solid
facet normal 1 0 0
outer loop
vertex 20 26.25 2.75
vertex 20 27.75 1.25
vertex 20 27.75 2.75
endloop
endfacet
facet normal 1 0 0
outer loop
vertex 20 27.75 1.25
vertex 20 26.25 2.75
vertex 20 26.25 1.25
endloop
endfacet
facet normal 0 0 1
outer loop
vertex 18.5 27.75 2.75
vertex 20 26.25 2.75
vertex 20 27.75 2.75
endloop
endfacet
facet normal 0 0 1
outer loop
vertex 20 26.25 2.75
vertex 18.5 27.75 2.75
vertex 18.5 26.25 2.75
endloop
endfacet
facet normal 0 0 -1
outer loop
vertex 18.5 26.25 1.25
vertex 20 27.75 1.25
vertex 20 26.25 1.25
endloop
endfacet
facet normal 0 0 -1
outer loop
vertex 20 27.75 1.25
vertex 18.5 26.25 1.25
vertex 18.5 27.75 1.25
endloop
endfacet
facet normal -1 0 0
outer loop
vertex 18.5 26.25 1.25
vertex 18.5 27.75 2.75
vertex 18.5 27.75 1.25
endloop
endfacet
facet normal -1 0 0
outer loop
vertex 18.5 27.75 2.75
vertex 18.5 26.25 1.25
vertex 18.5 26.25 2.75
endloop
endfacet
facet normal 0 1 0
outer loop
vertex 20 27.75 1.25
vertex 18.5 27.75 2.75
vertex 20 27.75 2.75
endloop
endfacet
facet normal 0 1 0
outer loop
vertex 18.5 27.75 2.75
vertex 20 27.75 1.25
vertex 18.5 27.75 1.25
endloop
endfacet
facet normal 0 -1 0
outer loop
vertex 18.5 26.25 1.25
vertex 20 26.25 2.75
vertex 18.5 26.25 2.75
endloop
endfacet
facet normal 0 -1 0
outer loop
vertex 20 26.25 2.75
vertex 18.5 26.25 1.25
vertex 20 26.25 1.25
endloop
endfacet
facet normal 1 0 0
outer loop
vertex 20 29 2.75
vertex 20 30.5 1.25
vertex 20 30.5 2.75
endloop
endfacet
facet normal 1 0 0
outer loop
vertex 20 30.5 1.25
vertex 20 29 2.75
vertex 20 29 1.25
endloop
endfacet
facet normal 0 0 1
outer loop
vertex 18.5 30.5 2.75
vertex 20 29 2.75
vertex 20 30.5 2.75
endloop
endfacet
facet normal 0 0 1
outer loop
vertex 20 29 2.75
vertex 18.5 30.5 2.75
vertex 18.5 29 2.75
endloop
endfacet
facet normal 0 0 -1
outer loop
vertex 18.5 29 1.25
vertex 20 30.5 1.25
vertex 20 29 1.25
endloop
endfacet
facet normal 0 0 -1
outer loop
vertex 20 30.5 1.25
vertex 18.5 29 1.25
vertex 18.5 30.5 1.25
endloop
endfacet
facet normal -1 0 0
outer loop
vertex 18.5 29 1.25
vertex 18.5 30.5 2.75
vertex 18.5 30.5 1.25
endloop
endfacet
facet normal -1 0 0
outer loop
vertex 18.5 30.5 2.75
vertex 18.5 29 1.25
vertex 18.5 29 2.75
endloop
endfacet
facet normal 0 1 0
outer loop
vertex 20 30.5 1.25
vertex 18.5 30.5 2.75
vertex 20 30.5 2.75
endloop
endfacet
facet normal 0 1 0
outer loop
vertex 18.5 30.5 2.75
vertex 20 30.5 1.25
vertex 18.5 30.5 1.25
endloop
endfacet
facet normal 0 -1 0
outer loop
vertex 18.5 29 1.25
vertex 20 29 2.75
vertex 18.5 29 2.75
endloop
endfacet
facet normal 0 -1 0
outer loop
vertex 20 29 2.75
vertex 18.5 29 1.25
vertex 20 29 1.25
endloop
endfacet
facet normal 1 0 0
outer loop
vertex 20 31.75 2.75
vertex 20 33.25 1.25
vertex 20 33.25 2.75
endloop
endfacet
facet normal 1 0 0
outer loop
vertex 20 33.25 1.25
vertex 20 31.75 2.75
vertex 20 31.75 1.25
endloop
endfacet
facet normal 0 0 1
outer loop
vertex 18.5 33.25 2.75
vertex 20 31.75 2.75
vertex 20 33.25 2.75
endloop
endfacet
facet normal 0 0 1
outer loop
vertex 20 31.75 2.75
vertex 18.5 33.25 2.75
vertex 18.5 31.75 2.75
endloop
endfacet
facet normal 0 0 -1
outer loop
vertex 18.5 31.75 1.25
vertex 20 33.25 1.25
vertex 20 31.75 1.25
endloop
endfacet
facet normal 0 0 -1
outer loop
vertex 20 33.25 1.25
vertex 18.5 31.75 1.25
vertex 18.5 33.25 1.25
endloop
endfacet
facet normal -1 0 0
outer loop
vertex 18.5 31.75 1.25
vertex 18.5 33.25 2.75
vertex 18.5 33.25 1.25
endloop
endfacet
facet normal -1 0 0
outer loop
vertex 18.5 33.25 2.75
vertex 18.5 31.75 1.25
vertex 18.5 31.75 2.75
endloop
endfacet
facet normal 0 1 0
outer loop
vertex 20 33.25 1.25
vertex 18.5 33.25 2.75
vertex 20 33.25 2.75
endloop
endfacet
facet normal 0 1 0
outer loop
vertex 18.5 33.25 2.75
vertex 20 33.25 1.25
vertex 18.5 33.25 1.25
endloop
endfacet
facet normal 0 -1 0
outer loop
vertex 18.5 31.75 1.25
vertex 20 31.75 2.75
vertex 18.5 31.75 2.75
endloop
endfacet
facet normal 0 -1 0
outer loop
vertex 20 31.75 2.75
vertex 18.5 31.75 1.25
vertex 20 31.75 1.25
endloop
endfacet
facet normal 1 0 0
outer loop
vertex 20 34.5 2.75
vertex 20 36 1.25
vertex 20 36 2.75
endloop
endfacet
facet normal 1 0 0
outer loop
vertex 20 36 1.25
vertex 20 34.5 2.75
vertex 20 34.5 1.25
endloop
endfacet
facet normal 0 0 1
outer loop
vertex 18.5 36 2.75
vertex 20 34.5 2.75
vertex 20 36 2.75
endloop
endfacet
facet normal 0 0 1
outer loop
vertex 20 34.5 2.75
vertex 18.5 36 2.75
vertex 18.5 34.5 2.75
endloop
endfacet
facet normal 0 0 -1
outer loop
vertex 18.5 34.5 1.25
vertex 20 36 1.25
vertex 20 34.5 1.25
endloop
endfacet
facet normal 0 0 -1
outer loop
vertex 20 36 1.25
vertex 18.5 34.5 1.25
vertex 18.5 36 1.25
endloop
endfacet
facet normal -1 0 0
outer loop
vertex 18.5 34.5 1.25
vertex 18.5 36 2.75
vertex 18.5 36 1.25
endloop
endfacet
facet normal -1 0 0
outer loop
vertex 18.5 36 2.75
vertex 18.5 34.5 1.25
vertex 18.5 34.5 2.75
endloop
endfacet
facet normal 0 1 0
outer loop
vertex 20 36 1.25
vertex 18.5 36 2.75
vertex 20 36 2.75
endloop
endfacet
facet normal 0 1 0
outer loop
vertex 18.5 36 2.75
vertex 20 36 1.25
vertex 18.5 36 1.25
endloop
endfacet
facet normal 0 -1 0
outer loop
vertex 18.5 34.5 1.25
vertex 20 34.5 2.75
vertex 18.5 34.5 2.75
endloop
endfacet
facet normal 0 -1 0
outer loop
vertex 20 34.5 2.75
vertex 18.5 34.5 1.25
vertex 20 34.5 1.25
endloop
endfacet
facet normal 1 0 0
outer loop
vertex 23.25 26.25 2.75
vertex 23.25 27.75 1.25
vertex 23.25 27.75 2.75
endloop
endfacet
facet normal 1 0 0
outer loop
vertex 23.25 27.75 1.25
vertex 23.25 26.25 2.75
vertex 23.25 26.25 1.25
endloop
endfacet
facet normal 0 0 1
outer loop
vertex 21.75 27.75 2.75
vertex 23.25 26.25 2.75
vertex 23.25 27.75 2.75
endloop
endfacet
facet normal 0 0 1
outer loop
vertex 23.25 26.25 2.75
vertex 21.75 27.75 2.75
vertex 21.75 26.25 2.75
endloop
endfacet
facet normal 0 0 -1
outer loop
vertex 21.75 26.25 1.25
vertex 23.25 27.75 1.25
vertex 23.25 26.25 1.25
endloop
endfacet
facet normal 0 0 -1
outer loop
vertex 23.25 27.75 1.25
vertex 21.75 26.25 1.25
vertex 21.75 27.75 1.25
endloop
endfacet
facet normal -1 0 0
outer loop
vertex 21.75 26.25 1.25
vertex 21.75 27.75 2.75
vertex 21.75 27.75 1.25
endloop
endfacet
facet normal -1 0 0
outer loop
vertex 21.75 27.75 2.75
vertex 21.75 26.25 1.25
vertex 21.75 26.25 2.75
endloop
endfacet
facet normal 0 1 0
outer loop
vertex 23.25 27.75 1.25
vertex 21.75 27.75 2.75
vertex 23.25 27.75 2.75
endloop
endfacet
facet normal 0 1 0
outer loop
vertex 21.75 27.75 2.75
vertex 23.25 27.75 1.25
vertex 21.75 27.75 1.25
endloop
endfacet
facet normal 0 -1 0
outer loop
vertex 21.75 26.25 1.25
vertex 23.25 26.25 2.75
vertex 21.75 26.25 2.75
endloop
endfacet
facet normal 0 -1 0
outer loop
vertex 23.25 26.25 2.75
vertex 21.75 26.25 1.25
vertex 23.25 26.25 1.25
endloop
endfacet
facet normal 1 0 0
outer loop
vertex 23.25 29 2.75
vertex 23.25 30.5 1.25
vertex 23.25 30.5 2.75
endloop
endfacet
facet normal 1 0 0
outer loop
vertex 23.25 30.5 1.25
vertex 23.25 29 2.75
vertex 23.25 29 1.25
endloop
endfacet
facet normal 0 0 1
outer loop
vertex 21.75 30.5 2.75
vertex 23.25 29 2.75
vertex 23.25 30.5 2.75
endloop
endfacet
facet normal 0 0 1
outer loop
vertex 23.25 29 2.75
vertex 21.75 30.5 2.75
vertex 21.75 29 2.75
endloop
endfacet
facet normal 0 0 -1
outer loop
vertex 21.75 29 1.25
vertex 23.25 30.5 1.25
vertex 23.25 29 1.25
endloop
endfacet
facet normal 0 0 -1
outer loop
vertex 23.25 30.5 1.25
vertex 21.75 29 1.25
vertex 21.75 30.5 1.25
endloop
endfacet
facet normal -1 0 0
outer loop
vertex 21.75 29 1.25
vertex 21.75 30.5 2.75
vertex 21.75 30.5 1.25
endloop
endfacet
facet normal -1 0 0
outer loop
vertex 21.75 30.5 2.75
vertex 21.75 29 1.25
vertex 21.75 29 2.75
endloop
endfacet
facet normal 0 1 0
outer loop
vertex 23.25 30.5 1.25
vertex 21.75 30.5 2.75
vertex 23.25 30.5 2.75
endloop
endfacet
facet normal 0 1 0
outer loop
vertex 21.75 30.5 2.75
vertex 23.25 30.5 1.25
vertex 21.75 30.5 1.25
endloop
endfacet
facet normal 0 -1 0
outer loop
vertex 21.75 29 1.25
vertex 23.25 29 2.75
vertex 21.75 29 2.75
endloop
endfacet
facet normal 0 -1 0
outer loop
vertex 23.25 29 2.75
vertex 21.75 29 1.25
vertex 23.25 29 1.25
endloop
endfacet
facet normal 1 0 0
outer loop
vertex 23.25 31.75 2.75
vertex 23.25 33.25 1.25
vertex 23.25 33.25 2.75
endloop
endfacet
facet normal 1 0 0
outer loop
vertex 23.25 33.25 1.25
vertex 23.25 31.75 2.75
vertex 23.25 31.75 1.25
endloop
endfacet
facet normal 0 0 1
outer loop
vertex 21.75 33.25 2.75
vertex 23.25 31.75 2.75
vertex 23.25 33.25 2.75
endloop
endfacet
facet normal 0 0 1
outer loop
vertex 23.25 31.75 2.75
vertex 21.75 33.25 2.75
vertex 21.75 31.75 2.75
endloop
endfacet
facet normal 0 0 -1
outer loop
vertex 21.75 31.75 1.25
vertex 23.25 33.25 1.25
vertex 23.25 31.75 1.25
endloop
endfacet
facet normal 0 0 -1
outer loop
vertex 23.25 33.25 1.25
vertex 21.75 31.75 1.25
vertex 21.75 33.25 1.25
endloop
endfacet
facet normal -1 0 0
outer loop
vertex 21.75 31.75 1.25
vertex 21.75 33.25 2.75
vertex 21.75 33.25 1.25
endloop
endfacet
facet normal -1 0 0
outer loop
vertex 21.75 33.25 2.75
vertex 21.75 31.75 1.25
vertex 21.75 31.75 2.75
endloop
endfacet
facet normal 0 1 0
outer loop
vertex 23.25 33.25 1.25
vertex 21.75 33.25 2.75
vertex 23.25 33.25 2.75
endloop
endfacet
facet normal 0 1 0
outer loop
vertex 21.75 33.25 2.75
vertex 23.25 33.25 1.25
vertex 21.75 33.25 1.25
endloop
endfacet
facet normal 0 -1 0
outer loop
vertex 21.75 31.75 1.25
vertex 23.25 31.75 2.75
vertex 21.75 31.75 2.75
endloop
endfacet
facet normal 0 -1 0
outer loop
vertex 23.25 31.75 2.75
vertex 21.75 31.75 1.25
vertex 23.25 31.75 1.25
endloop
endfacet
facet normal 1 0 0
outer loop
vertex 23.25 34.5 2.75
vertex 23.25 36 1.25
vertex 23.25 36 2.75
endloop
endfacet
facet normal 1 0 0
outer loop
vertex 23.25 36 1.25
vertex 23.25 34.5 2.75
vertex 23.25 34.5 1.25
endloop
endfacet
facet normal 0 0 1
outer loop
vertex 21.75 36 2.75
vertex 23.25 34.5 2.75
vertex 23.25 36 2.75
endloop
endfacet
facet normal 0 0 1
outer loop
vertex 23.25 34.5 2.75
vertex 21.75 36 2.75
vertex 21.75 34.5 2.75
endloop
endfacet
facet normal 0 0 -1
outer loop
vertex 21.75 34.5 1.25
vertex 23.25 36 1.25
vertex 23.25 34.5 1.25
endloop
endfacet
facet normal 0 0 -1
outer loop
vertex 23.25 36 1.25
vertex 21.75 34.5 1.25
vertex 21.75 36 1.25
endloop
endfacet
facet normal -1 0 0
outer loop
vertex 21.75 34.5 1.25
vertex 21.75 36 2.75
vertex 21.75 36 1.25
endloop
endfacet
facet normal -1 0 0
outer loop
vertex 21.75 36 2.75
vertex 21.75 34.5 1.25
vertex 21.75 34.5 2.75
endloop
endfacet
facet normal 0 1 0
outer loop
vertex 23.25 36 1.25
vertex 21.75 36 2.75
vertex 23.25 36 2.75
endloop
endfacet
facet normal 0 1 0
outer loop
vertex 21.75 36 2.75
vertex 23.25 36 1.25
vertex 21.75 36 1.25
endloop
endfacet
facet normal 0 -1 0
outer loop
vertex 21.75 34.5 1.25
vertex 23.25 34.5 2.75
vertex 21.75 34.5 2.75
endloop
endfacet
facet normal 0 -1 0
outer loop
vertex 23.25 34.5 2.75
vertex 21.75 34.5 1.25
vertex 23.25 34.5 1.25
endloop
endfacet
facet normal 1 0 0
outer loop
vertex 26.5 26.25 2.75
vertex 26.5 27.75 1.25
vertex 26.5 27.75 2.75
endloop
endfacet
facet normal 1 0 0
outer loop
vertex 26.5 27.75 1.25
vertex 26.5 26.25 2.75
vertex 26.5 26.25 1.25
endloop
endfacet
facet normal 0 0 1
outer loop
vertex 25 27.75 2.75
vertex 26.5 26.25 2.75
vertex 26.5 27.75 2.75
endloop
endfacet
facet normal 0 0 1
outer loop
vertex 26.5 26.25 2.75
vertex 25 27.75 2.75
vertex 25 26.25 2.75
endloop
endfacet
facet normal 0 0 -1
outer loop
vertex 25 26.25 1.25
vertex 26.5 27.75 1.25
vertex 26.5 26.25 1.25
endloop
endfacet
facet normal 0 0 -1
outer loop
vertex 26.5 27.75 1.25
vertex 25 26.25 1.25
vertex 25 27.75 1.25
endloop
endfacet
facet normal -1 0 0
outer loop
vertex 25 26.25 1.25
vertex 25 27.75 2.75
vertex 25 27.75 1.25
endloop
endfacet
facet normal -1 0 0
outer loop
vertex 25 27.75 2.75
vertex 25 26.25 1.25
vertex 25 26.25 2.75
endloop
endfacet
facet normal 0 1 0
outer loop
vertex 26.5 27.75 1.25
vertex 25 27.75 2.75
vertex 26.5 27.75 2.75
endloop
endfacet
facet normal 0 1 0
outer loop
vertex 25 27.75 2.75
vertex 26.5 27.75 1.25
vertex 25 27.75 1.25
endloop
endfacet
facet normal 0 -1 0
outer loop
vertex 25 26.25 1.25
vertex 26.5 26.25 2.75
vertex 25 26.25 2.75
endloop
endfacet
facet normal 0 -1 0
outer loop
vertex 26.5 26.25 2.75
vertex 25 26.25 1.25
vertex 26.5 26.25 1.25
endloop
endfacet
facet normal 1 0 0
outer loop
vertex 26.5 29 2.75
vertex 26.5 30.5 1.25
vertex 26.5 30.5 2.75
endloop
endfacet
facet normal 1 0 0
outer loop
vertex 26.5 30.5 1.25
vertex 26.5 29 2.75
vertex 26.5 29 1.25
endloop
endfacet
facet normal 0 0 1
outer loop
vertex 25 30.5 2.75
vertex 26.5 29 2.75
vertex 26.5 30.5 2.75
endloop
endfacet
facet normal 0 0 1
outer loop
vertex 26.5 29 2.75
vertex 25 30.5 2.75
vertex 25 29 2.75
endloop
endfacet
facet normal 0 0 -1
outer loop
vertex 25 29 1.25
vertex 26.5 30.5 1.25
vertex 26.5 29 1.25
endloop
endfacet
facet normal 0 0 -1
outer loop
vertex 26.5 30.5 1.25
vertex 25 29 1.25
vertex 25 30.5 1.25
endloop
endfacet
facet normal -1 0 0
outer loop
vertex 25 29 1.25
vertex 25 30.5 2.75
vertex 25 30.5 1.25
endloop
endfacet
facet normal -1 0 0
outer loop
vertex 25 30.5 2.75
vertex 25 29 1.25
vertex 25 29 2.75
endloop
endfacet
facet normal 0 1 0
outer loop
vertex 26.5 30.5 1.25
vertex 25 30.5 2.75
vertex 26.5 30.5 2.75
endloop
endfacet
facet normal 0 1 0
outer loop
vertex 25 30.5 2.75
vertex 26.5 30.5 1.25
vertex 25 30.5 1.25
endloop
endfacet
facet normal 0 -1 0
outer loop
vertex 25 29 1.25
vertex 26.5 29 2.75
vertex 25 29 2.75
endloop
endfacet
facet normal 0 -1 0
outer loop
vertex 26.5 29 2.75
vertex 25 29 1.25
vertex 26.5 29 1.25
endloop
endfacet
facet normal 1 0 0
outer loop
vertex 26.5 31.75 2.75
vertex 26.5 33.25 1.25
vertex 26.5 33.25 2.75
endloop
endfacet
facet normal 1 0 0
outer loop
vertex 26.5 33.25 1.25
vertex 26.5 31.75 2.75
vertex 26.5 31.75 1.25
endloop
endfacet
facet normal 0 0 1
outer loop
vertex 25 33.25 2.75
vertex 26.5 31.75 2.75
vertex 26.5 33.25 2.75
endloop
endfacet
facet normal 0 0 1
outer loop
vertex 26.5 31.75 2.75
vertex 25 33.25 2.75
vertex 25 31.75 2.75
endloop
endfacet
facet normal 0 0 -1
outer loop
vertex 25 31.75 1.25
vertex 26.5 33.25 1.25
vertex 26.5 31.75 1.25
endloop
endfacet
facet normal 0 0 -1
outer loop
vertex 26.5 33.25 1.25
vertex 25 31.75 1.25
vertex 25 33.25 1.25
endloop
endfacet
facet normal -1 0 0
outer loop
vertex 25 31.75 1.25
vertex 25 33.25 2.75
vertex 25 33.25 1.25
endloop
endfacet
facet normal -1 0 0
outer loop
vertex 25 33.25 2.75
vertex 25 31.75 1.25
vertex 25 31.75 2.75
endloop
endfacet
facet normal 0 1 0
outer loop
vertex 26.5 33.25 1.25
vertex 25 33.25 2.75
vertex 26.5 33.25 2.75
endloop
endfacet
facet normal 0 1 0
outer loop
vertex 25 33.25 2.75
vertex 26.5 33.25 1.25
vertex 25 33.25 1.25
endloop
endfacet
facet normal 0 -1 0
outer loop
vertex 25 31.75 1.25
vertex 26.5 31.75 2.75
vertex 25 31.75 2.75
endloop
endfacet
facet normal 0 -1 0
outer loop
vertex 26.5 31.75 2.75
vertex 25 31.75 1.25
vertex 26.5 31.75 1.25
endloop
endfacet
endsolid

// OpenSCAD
union() {
  for (ix = [0:2]) {
    for (iy = [0:3]) {
      if (!(ix == 2 && iy == 3)) {
        translate([18.5 + ix * 3.25, 26.25 + iy * 2.75, 1.25]) cube(size=[1.5,1.5,1.5], center=false);
      }
    }
  }
}
